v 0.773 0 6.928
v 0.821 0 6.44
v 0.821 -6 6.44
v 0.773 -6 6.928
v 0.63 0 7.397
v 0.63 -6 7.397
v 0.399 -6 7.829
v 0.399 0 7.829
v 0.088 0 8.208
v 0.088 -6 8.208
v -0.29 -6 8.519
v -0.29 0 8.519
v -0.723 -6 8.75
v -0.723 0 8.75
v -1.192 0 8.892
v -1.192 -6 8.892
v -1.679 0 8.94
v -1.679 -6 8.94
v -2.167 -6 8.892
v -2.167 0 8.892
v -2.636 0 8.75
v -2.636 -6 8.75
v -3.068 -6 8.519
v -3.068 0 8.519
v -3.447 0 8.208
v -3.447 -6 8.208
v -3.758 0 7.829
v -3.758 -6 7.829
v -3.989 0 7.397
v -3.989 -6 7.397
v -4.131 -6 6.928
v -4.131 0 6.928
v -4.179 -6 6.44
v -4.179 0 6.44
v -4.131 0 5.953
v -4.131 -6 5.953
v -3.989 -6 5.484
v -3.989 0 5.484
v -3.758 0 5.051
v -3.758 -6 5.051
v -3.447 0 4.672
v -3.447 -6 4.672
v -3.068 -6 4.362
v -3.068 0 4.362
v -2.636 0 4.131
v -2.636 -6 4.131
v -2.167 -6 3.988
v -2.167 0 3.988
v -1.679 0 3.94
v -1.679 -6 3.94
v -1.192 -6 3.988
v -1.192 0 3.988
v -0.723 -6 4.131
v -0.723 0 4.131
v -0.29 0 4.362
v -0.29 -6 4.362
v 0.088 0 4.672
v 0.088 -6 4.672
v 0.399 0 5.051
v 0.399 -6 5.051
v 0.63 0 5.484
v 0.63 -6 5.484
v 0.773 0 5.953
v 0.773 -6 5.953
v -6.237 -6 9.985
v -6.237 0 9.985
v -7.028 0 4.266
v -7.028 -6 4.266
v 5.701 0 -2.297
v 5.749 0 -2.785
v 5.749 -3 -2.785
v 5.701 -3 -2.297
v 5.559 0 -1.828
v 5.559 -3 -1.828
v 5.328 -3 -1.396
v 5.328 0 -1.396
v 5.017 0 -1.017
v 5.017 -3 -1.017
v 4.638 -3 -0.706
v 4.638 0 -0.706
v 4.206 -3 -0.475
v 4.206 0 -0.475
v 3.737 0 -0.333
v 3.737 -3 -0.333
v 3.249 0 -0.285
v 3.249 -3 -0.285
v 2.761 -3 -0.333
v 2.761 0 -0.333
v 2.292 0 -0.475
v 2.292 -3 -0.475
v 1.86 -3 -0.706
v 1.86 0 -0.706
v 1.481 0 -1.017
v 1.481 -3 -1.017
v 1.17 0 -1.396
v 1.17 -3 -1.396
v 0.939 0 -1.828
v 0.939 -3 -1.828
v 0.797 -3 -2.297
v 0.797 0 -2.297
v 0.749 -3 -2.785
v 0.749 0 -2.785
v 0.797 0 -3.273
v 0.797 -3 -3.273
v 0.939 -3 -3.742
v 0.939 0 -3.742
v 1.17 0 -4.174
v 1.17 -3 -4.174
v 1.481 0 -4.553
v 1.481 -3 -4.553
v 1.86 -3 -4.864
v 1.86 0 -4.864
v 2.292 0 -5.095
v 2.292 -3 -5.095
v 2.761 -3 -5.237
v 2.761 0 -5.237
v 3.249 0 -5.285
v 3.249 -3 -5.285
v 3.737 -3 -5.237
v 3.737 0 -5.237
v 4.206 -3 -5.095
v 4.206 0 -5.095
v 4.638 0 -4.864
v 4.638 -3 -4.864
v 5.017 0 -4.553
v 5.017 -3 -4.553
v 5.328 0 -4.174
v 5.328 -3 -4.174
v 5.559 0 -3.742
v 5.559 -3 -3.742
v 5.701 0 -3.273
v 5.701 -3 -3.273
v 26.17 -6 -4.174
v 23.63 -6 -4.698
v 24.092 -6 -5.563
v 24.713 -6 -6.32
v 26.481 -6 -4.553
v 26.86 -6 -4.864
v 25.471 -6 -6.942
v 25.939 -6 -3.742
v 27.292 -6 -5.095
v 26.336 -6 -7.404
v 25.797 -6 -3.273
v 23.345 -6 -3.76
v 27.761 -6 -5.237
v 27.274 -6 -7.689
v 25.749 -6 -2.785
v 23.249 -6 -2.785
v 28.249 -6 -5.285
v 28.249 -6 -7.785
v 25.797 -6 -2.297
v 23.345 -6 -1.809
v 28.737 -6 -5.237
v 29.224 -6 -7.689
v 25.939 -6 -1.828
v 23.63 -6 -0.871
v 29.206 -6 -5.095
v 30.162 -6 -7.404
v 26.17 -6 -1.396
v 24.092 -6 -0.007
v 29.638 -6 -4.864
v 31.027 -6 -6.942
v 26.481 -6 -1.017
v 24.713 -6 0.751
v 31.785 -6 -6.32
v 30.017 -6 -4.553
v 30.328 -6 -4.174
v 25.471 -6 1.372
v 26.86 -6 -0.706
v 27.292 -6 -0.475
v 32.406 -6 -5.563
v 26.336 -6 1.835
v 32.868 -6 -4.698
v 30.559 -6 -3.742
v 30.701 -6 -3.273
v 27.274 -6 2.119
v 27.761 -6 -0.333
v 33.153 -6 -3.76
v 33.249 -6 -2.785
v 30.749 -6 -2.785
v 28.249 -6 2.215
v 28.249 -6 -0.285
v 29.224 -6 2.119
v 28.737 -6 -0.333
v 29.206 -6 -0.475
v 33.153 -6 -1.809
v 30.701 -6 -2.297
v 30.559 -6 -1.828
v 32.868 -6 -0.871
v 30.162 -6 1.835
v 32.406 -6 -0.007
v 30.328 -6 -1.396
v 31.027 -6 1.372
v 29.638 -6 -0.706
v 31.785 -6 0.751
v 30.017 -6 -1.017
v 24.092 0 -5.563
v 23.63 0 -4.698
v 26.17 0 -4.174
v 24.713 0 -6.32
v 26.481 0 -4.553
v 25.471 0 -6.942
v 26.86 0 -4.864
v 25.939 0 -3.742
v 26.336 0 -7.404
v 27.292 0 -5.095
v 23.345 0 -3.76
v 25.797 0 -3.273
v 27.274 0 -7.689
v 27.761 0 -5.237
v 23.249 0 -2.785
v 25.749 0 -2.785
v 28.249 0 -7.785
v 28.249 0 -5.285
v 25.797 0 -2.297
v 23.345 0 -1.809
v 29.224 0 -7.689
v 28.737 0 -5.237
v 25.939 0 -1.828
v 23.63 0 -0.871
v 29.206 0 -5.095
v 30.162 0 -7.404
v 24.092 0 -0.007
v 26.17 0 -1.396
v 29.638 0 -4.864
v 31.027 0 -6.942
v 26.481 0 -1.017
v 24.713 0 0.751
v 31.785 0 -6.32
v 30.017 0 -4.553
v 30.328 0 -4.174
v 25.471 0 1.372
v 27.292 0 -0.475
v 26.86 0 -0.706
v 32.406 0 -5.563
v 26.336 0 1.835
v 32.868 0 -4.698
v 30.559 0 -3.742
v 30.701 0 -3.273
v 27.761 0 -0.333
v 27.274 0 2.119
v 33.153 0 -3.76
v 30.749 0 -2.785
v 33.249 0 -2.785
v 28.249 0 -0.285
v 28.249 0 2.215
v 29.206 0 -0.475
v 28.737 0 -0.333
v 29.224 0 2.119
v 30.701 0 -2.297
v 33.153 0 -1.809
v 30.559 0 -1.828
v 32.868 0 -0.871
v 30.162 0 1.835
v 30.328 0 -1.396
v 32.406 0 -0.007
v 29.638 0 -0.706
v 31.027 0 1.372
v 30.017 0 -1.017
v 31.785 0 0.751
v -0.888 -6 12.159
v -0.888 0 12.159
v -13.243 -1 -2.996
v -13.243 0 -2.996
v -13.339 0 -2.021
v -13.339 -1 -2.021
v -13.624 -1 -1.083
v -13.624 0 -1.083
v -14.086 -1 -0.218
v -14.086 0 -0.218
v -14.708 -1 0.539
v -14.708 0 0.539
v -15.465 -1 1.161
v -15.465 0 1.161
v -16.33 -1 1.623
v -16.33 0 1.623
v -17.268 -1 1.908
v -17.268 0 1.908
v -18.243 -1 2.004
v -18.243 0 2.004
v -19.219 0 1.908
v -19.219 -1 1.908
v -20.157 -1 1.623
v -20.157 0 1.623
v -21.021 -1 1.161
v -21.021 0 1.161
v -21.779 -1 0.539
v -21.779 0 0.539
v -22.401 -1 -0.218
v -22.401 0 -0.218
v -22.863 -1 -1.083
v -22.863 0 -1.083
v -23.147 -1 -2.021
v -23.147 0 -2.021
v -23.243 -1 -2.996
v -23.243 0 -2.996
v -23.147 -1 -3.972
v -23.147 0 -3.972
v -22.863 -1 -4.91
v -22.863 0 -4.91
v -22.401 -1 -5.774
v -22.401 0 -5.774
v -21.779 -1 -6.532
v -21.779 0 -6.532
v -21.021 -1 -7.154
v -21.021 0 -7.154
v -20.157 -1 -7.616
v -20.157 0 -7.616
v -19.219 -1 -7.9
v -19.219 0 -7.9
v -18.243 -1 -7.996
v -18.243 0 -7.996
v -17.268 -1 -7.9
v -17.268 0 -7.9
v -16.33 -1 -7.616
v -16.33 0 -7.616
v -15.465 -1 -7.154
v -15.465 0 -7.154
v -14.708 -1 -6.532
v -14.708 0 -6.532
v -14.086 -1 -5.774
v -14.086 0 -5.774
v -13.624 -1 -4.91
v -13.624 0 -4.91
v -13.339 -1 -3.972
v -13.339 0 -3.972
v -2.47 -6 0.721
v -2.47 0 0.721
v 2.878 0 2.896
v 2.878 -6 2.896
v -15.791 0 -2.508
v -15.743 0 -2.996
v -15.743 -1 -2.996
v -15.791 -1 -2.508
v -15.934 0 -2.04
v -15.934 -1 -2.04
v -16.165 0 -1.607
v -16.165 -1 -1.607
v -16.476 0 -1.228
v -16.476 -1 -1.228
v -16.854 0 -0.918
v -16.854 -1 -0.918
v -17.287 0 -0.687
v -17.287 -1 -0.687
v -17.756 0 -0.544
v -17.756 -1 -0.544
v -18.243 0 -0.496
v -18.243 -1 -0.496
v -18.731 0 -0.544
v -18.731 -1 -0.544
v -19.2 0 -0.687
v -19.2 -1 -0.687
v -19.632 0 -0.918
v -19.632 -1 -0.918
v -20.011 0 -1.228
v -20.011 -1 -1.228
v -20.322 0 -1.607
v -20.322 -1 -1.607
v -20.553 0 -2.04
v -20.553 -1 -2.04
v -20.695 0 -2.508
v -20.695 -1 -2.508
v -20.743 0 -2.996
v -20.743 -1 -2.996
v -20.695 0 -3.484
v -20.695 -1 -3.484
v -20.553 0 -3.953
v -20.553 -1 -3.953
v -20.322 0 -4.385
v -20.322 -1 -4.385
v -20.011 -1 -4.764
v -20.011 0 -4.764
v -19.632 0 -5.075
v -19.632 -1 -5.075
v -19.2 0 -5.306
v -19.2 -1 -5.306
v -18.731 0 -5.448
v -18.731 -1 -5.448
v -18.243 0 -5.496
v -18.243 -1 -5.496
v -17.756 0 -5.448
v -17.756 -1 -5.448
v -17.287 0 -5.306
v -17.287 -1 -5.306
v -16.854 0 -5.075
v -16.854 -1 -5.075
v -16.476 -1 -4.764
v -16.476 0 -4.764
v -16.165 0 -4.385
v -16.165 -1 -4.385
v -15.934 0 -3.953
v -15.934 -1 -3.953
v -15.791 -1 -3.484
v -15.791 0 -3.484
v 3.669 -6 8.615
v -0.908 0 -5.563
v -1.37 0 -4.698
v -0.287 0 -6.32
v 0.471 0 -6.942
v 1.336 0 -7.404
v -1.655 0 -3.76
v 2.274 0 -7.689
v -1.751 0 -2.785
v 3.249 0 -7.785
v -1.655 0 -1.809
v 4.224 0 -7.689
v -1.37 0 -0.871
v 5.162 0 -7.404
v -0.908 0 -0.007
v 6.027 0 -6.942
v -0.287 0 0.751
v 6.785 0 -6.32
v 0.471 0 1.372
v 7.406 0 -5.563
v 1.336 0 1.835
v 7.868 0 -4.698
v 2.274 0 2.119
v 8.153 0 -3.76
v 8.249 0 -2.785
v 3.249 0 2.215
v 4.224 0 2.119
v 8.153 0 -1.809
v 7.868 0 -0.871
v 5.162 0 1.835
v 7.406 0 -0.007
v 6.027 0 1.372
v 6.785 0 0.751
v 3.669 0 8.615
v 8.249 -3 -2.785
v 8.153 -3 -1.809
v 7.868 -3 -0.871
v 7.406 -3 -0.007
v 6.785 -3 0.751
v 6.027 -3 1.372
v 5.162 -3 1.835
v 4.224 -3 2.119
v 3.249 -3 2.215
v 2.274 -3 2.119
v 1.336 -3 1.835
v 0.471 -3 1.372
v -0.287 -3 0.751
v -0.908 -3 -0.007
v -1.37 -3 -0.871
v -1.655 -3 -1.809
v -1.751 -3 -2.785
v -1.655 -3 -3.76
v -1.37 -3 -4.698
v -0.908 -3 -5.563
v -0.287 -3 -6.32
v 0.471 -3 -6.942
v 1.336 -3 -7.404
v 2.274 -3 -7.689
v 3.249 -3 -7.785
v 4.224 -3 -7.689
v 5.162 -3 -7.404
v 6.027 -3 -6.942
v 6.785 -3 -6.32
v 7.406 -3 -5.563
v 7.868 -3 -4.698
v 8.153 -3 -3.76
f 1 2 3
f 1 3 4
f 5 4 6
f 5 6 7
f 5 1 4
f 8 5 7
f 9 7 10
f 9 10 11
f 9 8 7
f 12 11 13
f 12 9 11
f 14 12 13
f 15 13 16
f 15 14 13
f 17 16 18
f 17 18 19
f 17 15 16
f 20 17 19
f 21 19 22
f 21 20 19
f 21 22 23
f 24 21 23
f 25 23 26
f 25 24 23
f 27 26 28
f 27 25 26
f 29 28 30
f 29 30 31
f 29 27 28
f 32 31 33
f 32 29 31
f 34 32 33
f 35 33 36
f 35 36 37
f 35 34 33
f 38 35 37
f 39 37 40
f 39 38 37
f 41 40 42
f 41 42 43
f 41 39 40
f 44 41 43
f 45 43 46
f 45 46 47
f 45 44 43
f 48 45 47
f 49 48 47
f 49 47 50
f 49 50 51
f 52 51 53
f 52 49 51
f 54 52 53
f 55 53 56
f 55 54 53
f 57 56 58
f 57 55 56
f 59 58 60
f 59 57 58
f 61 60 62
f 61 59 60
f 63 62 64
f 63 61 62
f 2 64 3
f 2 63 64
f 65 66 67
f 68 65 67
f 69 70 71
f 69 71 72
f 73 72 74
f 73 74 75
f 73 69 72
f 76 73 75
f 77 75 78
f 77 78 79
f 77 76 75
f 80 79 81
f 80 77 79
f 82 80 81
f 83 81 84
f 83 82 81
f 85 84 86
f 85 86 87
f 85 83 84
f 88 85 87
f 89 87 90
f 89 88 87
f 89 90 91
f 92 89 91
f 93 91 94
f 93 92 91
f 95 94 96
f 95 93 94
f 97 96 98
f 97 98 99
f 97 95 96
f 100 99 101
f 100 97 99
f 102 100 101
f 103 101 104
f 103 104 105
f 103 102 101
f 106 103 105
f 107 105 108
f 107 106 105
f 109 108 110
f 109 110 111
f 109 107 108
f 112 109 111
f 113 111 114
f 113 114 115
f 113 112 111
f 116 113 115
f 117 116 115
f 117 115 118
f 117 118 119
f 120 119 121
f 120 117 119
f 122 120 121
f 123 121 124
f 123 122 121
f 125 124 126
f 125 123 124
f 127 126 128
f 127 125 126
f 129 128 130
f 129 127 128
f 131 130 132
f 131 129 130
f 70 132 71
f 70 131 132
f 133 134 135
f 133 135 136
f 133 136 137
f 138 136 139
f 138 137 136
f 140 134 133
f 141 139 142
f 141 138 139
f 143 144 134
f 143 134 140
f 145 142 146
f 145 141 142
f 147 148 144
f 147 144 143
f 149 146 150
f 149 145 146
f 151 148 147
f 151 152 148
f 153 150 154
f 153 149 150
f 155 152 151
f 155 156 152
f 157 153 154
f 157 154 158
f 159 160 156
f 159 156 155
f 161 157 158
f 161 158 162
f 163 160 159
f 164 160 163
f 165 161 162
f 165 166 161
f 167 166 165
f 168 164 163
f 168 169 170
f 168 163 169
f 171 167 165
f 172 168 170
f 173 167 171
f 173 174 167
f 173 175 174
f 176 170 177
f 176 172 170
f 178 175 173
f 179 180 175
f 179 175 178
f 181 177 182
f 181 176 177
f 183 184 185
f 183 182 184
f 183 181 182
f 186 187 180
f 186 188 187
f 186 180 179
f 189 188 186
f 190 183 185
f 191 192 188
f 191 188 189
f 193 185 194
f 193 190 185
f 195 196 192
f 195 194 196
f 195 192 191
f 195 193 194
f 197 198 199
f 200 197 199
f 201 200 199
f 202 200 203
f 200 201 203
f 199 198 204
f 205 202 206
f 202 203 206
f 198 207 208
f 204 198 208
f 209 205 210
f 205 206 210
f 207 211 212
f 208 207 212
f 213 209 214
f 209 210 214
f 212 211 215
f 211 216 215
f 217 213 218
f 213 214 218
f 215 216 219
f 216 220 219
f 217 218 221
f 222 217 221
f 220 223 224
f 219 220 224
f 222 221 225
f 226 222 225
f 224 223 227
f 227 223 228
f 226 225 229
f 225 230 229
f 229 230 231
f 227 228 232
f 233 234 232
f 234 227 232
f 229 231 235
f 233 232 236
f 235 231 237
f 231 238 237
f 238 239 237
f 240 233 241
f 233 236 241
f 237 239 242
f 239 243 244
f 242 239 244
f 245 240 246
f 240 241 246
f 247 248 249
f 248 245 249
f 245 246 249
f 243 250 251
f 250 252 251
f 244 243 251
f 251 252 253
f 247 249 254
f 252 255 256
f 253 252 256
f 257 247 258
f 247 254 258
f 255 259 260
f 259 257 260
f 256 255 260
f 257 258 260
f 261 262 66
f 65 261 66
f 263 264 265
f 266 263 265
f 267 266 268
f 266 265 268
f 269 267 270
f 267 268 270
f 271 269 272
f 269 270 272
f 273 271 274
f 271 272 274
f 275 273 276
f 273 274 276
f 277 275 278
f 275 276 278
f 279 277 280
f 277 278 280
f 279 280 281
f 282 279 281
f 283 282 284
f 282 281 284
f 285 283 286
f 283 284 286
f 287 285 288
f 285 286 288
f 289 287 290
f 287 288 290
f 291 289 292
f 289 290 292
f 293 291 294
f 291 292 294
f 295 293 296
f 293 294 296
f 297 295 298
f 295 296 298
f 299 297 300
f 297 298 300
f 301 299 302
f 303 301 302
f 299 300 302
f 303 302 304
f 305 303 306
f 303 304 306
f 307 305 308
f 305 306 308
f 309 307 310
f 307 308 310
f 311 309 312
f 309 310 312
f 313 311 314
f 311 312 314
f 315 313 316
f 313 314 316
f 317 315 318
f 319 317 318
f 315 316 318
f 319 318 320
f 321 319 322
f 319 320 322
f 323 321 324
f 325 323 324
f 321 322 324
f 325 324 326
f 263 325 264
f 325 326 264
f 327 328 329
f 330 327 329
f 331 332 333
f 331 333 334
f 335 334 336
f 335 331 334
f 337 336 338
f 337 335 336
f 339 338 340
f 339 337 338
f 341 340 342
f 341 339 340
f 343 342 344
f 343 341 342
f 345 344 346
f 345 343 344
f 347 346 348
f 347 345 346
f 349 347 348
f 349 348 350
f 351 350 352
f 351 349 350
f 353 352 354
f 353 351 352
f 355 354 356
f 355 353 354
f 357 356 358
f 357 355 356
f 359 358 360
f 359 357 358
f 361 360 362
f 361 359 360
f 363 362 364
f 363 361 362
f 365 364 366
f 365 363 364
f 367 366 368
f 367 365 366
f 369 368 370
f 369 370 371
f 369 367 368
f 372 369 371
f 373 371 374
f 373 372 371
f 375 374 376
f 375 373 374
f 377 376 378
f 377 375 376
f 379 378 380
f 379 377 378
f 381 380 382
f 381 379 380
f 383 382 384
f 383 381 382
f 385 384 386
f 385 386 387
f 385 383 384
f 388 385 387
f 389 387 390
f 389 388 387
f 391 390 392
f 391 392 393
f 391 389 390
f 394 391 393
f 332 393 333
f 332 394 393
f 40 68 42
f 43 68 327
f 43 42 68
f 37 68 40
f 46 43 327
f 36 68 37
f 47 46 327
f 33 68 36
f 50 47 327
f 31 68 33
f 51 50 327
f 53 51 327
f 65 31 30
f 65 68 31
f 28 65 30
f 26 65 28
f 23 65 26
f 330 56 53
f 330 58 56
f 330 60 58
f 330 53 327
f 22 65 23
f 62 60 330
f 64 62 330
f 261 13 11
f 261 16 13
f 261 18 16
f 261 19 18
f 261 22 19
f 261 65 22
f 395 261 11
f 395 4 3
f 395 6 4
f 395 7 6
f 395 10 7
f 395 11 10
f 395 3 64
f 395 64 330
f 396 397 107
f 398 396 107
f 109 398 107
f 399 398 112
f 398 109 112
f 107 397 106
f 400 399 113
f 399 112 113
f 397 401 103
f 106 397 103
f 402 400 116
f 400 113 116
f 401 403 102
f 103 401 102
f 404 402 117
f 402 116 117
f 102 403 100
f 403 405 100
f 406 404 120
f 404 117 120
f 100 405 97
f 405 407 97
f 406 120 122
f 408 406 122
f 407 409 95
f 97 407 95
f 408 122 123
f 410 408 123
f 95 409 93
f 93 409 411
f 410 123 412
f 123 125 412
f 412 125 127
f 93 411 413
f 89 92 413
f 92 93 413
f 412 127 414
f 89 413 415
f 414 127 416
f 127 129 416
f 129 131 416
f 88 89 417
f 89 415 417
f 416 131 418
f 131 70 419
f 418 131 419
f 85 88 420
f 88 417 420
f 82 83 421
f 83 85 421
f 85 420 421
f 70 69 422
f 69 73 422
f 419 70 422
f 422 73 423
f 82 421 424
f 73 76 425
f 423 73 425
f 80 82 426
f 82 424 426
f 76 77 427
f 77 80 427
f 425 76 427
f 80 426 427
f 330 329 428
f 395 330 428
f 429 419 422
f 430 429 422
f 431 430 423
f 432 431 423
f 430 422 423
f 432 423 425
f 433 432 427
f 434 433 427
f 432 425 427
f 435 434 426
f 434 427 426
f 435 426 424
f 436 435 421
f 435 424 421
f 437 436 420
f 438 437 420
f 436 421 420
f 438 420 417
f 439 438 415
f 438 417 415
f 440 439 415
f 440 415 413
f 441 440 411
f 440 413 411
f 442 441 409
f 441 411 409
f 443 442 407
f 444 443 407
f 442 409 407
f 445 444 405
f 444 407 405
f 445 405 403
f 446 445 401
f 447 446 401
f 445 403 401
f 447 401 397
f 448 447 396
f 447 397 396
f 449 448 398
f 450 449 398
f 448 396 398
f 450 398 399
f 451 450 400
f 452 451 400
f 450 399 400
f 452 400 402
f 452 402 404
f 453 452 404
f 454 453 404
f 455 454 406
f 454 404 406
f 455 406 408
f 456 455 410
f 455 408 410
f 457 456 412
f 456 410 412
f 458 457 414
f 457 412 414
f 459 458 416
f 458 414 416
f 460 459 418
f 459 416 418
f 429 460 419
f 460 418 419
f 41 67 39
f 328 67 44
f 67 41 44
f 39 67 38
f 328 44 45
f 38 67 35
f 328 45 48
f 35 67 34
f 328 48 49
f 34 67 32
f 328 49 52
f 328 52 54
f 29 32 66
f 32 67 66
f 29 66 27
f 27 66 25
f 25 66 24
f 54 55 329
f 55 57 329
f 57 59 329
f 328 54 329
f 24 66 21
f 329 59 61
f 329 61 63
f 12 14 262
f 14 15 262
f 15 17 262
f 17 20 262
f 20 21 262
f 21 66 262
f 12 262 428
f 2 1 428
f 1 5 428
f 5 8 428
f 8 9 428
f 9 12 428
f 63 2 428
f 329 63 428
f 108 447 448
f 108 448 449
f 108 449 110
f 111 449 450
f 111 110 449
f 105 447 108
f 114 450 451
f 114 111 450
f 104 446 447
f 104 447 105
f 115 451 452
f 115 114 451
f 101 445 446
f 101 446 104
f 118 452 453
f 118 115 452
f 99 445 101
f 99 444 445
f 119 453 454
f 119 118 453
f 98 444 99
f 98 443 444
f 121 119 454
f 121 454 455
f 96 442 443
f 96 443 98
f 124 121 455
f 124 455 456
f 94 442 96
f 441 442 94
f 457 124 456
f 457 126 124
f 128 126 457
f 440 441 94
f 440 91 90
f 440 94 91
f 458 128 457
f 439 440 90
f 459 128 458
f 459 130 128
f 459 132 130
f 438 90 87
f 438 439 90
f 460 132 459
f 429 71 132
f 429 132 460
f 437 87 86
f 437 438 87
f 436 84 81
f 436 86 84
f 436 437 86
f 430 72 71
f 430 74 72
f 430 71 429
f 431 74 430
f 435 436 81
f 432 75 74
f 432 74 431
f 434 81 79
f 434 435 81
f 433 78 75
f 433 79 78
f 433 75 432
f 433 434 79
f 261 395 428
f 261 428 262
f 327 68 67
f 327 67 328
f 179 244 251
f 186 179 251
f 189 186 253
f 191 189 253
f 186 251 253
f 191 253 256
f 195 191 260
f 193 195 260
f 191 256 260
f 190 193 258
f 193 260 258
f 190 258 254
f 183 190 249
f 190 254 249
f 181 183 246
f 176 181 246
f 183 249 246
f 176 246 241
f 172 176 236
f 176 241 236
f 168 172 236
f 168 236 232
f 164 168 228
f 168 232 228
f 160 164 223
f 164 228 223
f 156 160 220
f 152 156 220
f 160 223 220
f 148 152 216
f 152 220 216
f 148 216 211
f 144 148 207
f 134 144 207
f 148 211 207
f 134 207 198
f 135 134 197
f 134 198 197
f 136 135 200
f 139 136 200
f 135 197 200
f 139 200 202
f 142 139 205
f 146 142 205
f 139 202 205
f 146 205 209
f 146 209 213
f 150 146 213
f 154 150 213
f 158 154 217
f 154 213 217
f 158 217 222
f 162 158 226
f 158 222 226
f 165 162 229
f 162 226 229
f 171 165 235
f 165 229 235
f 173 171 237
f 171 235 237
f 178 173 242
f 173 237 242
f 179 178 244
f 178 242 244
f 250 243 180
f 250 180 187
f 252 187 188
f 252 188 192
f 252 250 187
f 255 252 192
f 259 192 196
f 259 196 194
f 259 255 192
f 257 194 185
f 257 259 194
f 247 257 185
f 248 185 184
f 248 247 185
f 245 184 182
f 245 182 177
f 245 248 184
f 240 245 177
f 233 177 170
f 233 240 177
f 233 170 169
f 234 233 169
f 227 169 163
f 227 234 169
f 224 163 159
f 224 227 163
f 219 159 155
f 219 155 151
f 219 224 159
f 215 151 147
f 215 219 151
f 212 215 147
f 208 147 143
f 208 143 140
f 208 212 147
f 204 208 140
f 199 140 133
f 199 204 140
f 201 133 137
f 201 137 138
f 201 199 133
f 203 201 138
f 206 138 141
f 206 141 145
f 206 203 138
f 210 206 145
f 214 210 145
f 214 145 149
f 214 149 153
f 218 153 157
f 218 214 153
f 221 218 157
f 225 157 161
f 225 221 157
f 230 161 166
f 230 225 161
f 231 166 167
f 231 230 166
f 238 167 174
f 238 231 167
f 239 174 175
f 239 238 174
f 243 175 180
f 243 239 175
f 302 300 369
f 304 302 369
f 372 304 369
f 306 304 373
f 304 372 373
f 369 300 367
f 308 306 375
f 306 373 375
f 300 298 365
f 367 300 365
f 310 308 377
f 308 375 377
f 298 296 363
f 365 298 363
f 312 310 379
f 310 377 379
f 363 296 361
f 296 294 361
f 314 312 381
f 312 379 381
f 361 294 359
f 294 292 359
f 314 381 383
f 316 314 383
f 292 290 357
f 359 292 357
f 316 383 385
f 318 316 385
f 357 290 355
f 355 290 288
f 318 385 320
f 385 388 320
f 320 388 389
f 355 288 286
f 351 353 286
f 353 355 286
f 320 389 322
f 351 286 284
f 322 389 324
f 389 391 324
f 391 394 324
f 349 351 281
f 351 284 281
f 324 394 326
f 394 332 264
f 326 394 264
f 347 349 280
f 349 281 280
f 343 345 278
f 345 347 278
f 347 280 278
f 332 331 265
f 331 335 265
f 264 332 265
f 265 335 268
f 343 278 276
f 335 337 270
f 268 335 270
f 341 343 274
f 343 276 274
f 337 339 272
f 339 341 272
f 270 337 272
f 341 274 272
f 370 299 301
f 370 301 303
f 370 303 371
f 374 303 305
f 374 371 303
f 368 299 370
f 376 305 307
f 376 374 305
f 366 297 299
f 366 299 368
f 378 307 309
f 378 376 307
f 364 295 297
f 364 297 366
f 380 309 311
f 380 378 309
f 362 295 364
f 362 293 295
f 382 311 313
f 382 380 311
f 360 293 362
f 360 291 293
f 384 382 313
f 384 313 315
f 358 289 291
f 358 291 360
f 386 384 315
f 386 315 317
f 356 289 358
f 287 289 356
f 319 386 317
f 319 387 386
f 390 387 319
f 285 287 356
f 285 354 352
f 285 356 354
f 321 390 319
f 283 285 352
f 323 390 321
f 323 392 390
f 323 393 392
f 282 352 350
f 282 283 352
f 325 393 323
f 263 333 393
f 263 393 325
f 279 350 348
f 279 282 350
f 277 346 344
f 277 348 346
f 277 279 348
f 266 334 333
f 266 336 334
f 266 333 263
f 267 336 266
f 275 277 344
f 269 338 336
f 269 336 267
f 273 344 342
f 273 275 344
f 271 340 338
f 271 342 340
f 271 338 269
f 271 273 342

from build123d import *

# Parameters (mm, degrees)
F0_R     = 5
F0_R_2   = 2.5
F1_DEPTH = 3
F2_DEPTH = 6
F3_DEPTH = 6
F4_R     = 5
F4_R_2   = 2.5
F5_DEPTH = 1


with BuildPart() as f1:
    # F0 (on Front) → F1 (new body)
    with BuildSketch(Plane.XZ):
        with Locations((3.249018, -2.784872)):
            Circle(F0_R)
        with Locations((3.249018, -2.784872)):
            Circle(F0_R_2, mode=Mode.SUBTRACT)
    extrude(amount=F1_DEPTH)


with BuildPart() as f2:
    # F0 (on Front) → F2 (new body)
    with BuildSketch(Plane.XZ):
        with Locations((28.249018, -2.784872)):
            Circle(F0_R)
        with Locations((28.249018, -2.784872)):
            Circle(F0_R_2, mode=Mode.SUBTRACT)
    extrude(amount=F2_DEPTH)


with BuildPart() as f3:
    # F0 (on Front) → F3 (new body)
    with BuildSketch(Plane.XZ):
        Polygon((3.669095, 8.614697), (-0.888231, 12.159286), (-6.236598, 9.98482), (-7.027639, 4.265765), (-2.470313, 0.721176), (2.878054, 2.895642), align=None)
        with Locations((-1.679272, 6.440231)):
            Circle(F0_R_2, mode=Mode.SUBTRACT)
    extrude(amount=F3_DEPTH)


with BuildPart() as f5:
    # F4 (on Front) → F5 (new body)
    with BuildSketch(Plane.XZ):
        with Locations((-18.24329, -2.996214)):
            Circle(F4_R)
        with Locations((-18.24329, -2.996214)):
            Circle(F4_R_2, mode=Mode.SUBTRACT)
    extrude(amount=F5_DEPTH)


solid = Compound([f1.part, f2.part, f3.part, f5.part])
